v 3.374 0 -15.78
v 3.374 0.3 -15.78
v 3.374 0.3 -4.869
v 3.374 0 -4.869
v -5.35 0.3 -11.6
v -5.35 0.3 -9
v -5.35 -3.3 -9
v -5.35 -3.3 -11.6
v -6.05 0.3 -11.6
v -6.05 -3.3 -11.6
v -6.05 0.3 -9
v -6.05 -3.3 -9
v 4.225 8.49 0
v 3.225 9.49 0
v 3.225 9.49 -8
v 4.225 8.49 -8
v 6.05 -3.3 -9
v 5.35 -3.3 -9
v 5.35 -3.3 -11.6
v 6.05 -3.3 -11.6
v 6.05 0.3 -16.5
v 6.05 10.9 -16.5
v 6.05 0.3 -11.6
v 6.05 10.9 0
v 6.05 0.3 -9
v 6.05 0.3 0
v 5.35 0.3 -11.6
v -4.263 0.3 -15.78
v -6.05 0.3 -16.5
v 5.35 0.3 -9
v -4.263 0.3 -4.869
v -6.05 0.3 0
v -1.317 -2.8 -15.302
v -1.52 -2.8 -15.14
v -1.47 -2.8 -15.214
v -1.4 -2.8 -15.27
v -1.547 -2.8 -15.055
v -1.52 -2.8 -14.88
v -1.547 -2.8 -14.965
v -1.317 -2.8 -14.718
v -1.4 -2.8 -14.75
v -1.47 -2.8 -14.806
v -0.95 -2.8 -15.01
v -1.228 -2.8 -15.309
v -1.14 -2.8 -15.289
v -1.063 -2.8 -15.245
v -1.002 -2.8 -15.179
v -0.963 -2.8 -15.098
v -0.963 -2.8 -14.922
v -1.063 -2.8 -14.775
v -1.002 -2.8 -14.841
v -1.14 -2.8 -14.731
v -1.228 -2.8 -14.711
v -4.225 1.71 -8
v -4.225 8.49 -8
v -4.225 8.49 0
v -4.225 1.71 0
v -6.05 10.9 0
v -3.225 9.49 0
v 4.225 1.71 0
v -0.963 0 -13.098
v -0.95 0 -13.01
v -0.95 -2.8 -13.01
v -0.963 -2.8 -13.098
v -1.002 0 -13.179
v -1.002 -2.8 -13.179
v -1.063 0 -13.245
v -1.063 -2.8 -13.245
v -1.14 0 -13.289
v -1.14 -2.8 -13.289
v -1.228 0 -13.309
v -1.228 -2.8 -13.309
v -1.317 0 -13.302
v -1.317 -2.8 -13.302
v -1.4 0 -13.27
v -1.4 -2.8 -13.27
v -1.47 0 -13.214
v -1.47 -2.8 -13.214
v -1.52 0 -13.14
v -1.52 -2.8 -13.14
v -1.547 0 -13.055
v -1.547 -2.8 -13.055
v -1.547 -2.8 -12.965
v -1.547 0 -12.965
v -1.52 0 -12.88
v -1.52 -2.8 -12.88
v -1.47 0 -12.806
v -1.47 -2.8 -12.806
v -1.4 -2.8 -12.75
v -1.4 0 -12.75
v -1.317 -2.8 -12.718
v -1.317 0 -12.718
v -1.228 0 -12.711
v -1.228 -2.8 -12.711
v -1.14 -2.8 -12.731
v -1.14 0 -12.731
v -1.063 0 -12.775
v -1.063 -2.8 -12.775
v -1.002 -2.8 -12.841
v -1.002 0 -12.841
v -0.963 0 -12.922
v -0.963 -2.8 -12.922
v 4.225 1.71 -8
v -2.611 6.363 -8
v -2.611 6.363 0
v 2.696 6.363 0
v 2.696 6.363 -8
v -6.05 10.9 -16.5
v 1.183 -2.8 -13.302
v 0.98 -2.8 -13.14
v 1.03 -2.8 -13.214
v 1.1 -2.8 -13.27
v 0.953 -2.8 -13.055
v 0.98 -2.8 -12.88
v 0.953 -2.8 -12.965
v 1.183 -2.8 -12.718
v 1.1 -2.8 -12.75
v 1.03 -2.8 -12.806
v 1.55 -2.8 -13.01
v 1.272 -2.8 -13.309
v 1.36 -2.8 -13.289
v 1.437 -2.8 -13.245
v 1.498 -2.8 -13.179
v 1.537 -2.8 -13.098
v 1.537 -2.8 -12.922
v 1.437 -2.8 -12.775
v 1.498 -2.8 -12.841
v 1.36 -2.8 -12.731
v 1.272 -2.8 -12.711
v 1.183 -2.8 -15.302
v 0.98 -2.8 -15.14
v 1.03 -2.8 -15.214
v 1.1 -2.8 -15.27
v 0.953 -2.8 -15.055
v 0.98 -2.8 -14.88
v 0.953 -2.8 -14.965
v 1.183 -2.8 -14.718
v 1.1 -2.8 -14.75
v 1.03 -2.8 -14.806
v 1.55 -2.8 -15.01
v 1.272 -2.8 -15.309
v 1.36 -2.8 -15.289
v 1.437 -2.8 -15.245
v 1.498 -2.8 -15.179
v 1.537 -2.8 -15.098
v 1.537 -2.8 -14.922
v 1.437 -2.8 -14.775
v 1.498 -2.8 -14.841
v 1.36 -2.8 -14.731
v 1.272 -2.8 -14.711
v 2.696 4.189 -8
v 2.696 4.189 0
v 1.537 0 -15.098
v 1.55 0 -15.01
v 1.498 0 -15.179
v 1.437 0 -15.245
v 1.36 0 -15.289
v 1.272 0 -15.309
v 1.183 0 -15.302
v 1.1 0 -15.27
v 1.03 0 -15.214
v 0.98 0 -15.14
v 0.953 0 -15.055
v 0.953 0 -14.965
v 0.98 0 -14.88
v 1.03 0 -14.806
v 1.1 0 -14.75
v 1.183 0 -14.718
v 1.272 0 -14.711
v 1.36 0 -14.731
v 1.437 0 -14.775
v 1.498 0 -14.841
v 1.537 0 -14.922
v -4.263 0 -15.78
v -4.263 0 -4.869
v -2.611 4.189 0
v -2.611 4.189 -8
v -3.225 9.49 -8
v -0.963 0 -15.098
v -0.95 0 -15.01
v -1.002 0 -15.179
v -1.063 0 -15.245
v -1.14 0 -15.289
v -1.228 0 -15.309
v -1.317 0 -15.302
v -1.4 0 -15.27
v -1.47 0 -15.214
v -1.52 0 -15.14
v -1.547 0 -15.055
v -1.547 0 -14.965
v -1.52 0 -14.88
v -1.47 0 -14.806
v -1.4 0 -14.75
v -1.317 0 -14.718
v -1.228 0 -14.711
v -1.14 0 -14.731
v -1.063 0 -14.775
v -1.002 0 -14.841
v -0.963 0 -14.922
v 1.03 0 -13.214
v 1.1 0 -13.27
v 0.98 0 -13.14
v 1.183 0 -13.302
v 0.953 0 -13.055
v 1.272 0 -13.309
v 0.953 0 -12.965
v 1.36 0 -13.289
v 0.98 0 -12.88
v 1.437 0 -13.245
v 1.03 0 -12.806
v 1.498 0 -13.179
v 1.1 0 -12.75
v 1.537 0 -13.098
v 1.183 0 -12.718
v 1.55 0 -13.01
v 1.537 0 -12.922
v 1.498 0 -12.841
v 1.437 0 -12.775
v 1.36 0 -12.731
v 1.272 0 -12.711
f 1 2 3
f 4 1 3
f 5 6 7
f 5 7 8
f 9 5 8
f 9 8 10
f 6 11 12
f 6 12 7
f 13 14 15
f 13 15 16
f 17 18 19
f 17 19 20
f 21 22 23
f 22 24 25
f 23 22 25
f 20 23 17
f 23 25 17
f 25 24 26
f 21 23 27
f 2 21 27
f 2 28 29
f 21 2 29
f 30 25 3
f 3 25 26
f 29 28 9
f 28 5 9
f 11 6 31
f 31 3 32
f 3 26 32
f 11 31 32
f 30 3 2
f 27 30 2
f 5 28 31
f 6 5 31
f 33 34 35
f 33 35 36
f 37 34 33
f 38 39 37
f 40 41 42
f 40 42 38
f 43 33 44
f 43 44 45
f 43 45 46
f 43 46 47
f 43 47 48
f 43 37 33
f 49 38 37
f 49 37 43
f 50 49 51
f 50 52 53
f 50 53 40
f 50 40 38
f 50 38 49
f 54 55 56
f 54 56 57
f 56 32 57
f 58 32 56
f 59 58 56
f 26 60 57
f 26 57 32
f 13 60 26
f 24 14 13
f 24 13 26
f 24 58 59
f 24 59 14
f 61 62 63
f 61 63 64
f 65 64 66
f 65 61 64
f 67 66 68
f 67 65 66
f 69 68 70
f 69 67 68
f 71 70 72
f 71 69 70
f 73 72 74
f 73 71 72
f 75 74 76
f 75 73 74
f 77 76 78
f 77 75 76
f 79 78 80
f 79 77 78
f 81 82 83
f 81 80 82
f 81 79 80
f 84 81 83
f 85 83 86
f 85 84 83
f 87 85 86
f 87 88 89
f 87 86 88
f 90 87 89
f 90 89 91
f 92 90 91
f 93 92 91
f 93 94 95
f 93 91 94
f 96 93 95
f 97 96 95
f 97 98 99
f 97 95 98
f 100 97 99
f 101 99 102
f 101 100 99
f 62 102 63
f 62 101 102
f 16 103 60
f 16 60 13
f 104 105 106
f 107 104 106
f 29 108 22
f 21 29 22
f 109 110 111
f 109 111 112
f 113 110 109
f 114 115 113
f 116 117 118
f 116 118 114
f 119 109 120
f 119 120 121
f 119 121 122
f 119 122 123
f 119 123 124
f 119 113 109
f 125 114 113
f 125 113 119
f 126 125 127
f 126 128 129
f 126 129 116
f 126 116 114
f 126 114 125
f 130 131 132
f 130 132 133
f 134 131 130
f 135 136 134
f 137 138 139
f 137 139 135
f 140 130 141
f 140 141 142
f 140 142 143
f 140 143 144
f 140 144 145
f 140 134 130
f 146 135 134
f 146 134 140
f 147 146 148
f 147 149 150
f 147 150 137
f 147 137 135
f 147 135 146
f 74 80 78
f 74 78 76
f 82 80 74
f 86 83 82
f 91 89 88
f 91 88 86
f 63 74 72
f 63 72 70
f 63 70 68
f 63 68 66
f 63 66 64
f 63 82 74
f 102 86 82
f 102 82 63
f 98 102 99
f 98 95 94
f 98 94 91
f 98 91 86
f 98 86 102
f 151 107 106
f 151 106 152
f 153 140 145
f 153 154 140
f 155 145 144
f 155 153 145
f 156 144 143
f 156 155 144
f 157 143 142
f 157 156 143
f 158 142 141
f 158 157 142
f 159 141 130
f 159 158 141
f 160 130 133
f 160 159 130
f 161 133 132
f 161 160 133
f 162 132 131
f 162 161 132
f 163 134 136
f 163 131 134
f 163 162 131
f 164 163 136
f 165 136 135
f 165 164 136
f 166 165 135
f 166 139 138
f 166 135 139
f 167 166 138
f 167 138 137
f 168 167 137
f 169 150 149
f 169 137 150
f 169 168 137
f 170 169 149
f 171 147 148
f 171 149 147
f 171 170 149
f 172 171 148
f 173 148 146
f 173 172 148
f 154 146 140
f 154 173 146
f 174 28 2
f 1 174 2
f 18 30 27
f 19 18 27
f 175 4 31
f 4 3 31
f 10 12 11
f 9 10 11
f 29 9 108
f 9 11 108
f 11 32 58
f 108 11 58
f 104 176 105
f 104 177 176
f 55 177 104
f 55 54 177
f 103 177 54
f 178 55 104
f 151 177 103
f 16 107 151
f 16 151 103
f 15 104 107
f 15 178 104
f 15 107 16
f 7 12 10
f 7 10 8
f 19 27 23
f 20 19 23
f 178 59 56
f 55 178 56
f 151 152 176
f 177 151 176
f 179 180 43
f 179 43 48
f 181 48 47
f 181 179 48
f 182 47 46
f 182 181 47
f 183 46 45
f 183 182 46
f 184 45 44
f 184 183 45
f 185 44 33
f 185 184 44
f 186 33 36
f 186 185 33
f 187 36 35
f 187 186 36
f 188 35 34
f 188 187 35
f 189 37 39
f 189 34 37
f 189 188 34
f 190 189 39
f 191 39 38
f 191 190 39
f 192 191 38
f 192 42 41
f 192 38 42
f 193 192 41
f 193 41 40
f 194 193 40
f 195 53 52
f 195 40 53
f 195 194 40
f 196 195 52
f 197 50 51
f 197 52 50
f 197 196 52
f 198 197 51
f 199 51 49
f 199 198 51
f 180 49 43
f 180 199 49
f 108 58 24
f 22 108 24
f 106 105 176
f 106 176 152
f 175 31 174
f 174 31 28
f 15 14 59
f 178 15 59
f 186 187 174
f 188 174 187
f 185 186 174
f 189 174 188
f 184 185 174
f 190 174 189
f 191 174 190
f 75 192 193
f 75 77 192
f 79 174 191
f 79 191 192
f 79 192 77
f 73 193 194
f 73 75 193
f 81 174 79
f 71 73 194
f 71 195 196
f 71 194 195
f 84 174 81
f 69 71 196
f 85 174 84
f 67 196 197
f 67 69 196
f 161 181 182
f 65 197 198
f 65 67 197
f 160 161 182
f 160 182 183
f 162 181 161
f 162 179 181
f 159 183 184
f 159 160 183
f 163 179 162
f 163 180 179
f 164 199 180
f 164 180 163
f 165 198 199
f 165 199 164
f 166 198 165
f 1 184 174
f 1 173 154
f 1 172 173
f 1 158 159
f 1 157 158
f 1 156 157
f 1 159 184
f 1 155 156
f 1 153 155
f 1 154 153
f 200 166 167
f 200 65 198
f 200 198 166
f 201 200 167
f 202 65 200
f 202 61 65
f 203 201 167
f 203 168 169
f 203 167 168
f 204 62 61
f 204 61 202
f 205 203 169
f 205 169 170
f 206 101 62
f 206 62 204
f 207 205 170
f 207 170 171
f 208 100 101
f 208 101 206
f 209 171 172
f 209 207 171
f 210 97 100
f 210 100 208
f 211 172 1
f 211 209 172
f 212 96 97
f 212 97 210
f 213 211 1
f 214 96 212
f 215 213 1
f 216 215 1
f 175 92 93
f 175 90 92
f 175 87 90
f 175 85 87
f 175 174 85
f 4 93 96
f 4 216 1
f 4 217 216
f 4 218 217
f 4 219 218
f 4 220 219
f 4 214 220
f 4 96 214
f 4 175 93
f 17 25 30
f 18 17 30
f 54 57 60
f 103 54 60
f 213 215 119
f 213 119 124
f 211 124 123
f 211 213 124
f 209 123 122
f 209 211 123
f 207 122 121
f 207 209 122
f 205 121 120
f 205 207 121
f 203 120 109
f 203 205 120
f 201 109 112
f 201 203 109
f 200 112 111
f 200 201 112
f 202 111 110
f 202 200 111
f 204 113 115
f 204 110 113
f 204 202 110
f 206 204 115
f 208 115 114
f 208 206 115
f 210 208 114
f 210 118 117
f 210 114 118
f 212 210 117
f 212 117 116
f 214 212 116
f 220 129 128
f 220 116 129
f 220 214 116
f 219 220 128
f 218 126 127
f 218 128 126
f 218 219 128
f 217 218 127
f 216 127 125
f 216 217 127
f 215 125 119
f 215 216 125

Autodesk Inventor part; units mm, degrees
ref_plane "YZ Plane" through (0, 0, 0) normal (1, 0, 0) x (0, 1, 0)
ref_plane "XZ Plane" through (0, 0, 0) normal (0, 1, 0) x (-1, 0, 0)
ref_plane "XY Plane" through (0, 0, 0) normal (0, 0, 1) x (1, 0, 0)
sketch "Sketch1" plane through (0, 0, 0) normal (0, 0, 1) x (1, 0, 0)
  line L0 (-6.05, 10.9) -> (6.05, 10.9)
  line L1 (6.05, 10.9) -> (6.05, 0.3)
  line L2 (6.05, 0.3) -> (-6.05, 0.3)
  line L3 (-6.05, 0.3) -> (-6.05, 10.9)
  point P0 (0, 0)
  dimension "d0" = 10.6
  dimension "d1" = 0.3
  dimension "d2" = 12.1
  dimension "d3" = 6.05
extrude "Extrusion1" add sketch "Sketch1" against normal blind 16.5
sketch "Sketch2" plane through (-6.05, 0.3, 0) normal (0, -1, 0) x (1, 0, 0)
  line L0 (9.4241, -4.8692) -> (1.7869, -4.8692)
  line L1 (1.7869, -4.8692) -> (1.7869, -15.7795)
  line L2 (1.7869, -15.7795) -> (9.4241, -15.7795)
  line L3 (9.4241, -15.7795) -> (9.4241, -4.8692)
  point P0 (6.05, 0)
extrude "Extrusion2" add sketch "Sketch2" along normal blind 0.3
sketch "Sketch3" plane through (-6.05, 0, 0) normal (0, -1, 0) x (1, 0, 0)
  circle A0 centre (4.8, -15.01) radius 0.3
  circle A1 centre (7.3, -15.01) radius 0.3
  circle A2 centre (4.8, -13.01) radius 0.3
  circle A3 centre (7.3, -13.01) radius 0.3
  line L0 (12.1, 0) -> (0, 0) projected
  point P0 (6.05, 0)
  dimension "d8" = 1.25
  dimension "d9" = 1.25
  dimension "d10" = 0
  dimension "d11" = 0
  dimension "d12" = 2
  dimension "d13" = 0
  dimension "d14" = 0
  dimension "d15" = 13.01
  dimension "d16" = 0.6
  dimension "d17" = 0.6
  dimension "d18" = 0.6
  dimension "d19" = 0.6
extrude "Extrusion3" add sketch "Sketch3" along normal blind 2.8
sketch "Sketch4" plane through (-6.05, 0.3, 0) normal (0, -1, 0) x (1, 0, 0)
  line L0 (12.1, 0) -> (12.1, -16.5) projected
  line L1 (12.1, -9) -> (11.4, -9)
  line L2 (11.4, -9) -> (11.4, -11.6)
  line L3 (11.4, -11.6) -> (12.1, -11.6)
  line L4 (12.1, -11.6) -> (12.1, -9)
  line L5 (0, 0) -> (0, -16.5) projected
  line L6 (0, -9) -> (0.7, -9)
  line L7 (0.7, -9) -> (0.7, -11.6)
  line L8 (0.7, -11.6) -> (0, -11.6)
  line L9 (0, -11.6) -> (0, -9)
  line L10 (12.1, 0) -> (0, 0) projected
  point P0 (6.05, 0)
  dimension "d22" = 2.6
  dimension "d23" = 2.6
  dimension "d24" = 9
  dimension "d25" = 0
  dimension "d26" = 0.7
  dimension "d27" = 0.7
extrude "Extrusion4" add sketch "Sketch4" along normal blind 3.6
sketch "Sketch5" plane through (0, 0, 0) normal (0, 0, 1) x (1, 0, 0)
  line L0 (-4.225, 1.71) -> (4.225, 1.71)
  line L1 (4.225, 1.71) -> (4.225, 9.49)
  line L2 (4.225, 9.49) -> (-4.225, 9.49)
  line L3 (-4.225, 9.49) -> (-4.225, 1.71)
  line L4 (6.05, 0.3) -> (-6.05, 0.3) projected
  line L5 (-3.225, 9.49) -> (-4.225, 8.49)
  line L6 (3.225, 9.49) -> (4.225, 8.49)
  point P0 (0, 0)
  dimension "d30" = 7.78
  dimension "d31" = 8.45
  dimension "d32" = 4.225
  dimension "d33" = 1.41
  dimension "d34" = 45
  dimension "d35" = 45
  dimension "d36" = 1
  dimension "d37" = 1
extrude "Extrusion5" cut sketch "Sketch5" against normal blind 8 contours L3 L5 L2 L6 L1 L0
sketch "Sketch6" plane through (0, 0, -8) normal (0, 0, 1) x (1, 0, 0)
  line L0 (-2.6112, 6.3628) -> (2.6965, 6.3628)
  line L1 (2.6965, 6.3628) -> (2.6965, 4.1886)
  line L2 (2.6965, 4.1886) -> (-2.6112, 4.1886)
  line L3 (-2.6112, 4.1886) -> (-2.6112, 6.3628)
  point P0 (0, 0)
extrude "Extrusion6" add sketch "Sketch6" along normal blind 8
properties part number "USB-B"
